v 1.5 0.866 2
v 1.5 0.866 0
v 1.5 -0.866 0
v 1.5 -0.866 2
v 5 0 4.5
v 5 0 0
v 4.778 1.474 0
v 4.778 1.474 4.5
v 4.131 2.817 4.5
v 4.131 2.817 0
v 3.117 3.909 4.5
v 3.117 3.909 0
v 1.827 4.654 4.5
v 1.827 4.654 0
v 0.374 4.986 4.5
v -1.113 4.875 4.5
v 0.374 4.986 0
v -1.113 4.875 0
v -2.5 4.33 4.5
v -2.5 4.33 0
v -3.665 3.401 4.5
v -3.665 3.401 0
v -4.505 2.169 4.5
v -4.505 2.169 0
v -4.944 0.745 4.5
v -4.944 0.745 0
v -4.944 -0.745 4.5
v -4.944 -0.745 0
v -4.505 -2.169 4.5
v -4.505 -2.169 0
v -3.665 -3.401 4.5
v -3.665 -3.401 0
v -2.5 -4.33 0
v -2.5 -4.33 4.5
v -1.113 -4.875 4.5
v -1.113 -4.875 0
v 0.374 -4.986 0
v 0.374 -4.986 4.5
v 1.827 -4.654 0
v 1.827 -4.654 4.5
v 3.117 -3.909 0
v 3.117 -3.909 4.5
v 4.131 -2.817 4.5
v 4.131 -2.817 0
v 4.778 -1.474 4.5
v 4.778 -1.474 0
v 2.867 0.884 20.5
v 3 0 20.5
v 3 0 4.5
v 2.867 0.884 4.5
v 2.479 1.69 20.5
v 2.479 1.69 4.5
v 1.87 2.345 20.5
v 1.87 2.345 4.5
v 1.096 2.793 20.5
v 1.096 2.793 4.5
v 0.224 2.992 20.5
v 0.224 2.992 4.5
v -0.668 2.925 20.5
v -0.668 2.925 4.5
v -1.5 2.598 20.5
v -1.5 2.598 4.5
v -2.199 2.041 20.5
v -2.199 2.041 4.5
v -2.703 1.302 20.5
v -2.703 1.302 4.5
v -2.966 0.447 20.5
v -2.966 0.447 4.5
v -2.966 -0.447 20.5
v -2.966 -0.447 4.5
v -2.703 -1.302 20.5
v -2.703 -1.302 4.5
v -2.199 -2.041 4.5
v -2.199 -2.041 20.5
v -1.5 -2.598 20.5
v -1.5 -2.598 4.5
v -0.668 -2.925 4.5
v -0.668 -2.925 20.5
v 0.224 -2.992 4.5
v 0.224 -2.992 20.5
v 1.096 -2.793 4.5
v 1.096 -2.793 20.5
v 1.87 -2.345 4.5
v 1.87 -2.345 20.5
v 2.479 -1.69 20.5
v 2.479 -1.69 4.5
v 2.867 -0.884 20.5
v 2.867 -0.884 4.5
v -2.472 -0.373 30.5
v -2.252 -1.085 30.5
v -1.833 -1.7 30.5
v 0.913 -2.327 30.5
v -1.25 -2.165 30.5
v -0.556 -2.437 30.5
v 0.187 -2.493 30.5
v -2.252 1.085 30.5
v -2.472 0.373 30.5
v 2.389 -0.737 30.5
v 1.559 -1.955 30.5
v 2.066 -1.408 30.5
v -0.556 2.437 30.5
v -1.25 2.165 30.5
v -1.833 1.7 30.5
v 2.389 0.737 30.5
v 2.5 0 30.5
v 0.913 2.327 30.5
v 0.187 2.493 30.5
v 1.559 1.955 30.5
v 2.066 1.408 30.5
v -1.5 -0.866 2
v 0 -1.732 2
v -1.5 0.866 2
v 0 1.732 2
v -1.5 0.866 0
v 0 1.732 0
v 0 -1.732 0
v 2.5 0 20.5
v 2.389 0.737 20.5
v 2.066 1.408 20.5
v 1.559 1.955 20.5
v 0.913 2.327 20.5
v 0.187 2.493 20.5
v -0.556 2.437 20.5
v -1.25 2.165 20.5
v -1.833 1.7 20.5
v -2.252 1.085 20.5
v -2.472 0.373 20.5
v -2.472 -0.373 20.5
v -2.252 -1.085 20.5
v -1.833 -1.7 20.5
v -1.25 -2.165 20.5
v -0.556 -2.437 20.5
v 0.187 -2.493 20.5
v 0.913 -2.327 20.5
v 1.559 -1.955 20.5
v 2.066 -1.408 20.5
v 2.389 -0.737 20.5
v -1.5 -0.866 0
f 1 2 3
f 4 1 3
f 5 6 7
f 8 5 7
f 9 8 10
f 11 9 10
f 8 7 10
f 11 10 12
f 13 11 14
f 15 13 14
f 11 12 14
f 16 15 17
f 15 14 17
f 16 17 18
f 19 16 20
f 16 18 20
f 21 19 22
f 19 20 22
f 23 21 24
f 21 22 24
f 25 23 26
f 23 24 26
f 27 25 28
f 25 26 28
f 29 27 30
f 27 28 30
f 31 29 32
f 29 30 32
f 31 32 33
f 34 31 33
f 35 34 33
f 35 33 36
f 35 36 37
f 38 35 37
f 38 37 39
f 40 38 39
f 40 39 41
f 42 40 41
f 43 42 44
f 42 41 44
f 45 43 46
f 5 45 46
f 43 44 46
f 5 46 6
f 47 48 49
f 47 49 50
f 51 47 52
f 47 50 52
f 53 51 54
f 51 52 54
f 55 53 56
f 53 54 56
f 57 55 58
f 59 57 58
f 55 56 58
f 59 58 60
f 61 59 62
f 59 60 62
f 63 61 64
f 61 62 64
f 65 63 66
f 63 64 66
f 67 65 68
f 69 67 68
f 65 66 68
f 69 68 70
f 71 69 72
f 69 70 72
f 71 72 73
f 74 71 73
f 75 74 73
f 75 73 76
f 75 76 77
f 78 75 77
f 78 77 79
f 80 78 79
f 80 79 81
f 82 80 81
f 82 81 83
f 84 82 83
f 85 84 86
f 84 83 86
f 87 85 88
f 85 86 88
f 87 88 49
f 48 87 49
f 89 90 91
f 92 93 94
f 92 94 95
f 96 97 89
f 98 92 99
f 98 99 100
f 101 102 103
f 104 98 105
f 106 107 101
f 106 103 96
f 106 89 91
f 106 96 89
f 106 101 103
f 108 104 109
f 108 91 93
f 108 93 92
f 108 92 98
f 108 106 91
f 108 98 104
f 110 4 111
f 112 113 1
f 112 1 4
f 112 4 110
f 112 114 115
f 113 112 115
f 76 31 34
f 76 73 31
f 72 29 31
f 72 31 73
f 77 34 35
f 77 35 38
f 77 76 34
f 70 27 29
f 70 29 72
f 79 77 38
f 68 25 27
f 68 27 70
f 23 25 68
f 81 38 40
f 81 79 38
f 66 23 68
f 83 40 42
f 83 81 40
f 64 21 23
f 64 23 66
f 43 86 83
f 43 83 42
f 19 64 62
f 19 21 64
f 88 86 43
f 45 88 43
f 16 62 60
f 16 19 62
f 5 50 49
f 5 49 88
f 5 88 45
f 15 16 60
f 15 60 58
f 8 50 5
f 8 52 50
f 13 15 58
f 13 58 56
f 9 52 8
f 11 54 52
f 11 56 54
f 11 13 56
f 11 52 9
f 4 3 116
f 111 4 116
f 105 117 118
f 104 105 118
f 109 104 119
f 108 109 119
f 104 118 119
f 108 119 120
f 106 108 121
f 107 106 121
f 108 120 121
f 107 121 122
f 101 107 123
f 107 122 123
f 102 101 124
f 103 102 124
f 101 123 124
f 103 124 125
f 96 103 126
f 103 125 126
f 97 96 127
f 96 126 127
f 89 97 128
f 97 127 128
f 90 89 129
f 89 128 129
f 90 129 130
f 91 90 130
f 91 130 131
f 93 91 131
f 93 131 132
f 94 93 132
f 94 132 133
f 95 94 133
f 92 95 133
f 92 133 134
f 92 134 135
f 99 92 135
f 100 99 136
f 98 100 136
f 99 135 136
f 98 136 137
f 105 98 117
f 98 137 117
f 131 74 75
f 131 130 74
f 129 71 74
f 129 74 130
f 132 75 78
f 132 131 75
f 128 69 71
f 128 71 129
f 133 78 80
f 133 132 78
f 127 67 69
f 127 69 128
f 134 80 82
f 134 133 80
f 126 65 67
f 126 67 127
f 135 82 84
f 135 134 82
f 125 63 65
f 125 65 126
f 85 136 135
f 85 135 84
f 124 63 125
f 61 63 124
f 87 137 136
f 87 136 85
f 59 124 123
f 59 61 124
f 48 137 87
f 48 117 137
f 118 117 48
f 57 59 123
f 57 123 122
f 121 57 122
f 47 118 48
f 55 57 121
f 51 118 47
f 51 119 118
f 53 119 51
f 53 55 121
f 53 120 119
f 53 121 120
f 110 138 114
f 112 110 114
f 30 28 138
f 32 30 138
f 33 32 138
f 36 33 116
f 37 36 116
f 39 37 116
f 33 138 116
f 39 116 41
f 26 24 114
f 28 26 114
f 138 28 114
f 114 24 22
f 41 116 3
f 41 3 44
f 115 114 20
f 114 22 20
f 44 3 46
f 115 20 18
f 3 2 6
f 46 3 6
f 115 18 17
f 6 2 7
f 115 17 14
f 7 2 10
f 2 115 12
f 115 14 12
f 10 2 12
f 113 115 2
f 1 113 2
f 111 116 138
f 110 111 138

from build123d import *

# Parameters (mm, degrees)
SKETCH_1_R          = 5
EXTRUDE_1_DEPTH     = 4.5
CUT_EXTRUDE_1_DEPTH = 2
SKETCH_3_R          = 3
EXTRUDE_2_DEPTH     = 16
SKETCH_4_R          = 2.5
EXTRUDE_3_DEPTH     = 10


with BuildPart() as part:
    # 草图1 → 凸台-拉伸1 (new body)
    with BuildSketch(Plane.XY):
        Circle(SKETCH_1_R)
    extrude(amount=EXTRUDE_1_DEPTH)

    # 草图2 → 切除-拉伸1 (cut)
    with BuildSketch(Plane(origin=(0, 0, 0), x_dir=(-1, 0, 0), z_dir=(0, 0, -1))):
        Polygon((1.5, -0.866025404), (1.5, 0.866025404), (0, 1.732050808), (-1.5, 0.866025404), (-1.5, -0.866025404), (0, -1.732050808), align=None)
    extrude(amount=-CUT_EXTRUDE_1_DEPTH, mode=Mode.SUBTRACT)

    # 草图3 → 凸台-拉伸2 (add)
    with BuildSketch(Plane.XY.offset(4.5)):
        Circle(SKETCH_3_R)
    extrude(amount=EXTRUDE_2_DEPTH)

    # 草图4 → 凸台-拉伸3 (add)
    with BuildSketch(Plane.XY.offset(20.5)):
        Circle(SKETCH_4_R)
    extrude(amount=EXTRUDE_3_DEPTH)


solid = part.part
